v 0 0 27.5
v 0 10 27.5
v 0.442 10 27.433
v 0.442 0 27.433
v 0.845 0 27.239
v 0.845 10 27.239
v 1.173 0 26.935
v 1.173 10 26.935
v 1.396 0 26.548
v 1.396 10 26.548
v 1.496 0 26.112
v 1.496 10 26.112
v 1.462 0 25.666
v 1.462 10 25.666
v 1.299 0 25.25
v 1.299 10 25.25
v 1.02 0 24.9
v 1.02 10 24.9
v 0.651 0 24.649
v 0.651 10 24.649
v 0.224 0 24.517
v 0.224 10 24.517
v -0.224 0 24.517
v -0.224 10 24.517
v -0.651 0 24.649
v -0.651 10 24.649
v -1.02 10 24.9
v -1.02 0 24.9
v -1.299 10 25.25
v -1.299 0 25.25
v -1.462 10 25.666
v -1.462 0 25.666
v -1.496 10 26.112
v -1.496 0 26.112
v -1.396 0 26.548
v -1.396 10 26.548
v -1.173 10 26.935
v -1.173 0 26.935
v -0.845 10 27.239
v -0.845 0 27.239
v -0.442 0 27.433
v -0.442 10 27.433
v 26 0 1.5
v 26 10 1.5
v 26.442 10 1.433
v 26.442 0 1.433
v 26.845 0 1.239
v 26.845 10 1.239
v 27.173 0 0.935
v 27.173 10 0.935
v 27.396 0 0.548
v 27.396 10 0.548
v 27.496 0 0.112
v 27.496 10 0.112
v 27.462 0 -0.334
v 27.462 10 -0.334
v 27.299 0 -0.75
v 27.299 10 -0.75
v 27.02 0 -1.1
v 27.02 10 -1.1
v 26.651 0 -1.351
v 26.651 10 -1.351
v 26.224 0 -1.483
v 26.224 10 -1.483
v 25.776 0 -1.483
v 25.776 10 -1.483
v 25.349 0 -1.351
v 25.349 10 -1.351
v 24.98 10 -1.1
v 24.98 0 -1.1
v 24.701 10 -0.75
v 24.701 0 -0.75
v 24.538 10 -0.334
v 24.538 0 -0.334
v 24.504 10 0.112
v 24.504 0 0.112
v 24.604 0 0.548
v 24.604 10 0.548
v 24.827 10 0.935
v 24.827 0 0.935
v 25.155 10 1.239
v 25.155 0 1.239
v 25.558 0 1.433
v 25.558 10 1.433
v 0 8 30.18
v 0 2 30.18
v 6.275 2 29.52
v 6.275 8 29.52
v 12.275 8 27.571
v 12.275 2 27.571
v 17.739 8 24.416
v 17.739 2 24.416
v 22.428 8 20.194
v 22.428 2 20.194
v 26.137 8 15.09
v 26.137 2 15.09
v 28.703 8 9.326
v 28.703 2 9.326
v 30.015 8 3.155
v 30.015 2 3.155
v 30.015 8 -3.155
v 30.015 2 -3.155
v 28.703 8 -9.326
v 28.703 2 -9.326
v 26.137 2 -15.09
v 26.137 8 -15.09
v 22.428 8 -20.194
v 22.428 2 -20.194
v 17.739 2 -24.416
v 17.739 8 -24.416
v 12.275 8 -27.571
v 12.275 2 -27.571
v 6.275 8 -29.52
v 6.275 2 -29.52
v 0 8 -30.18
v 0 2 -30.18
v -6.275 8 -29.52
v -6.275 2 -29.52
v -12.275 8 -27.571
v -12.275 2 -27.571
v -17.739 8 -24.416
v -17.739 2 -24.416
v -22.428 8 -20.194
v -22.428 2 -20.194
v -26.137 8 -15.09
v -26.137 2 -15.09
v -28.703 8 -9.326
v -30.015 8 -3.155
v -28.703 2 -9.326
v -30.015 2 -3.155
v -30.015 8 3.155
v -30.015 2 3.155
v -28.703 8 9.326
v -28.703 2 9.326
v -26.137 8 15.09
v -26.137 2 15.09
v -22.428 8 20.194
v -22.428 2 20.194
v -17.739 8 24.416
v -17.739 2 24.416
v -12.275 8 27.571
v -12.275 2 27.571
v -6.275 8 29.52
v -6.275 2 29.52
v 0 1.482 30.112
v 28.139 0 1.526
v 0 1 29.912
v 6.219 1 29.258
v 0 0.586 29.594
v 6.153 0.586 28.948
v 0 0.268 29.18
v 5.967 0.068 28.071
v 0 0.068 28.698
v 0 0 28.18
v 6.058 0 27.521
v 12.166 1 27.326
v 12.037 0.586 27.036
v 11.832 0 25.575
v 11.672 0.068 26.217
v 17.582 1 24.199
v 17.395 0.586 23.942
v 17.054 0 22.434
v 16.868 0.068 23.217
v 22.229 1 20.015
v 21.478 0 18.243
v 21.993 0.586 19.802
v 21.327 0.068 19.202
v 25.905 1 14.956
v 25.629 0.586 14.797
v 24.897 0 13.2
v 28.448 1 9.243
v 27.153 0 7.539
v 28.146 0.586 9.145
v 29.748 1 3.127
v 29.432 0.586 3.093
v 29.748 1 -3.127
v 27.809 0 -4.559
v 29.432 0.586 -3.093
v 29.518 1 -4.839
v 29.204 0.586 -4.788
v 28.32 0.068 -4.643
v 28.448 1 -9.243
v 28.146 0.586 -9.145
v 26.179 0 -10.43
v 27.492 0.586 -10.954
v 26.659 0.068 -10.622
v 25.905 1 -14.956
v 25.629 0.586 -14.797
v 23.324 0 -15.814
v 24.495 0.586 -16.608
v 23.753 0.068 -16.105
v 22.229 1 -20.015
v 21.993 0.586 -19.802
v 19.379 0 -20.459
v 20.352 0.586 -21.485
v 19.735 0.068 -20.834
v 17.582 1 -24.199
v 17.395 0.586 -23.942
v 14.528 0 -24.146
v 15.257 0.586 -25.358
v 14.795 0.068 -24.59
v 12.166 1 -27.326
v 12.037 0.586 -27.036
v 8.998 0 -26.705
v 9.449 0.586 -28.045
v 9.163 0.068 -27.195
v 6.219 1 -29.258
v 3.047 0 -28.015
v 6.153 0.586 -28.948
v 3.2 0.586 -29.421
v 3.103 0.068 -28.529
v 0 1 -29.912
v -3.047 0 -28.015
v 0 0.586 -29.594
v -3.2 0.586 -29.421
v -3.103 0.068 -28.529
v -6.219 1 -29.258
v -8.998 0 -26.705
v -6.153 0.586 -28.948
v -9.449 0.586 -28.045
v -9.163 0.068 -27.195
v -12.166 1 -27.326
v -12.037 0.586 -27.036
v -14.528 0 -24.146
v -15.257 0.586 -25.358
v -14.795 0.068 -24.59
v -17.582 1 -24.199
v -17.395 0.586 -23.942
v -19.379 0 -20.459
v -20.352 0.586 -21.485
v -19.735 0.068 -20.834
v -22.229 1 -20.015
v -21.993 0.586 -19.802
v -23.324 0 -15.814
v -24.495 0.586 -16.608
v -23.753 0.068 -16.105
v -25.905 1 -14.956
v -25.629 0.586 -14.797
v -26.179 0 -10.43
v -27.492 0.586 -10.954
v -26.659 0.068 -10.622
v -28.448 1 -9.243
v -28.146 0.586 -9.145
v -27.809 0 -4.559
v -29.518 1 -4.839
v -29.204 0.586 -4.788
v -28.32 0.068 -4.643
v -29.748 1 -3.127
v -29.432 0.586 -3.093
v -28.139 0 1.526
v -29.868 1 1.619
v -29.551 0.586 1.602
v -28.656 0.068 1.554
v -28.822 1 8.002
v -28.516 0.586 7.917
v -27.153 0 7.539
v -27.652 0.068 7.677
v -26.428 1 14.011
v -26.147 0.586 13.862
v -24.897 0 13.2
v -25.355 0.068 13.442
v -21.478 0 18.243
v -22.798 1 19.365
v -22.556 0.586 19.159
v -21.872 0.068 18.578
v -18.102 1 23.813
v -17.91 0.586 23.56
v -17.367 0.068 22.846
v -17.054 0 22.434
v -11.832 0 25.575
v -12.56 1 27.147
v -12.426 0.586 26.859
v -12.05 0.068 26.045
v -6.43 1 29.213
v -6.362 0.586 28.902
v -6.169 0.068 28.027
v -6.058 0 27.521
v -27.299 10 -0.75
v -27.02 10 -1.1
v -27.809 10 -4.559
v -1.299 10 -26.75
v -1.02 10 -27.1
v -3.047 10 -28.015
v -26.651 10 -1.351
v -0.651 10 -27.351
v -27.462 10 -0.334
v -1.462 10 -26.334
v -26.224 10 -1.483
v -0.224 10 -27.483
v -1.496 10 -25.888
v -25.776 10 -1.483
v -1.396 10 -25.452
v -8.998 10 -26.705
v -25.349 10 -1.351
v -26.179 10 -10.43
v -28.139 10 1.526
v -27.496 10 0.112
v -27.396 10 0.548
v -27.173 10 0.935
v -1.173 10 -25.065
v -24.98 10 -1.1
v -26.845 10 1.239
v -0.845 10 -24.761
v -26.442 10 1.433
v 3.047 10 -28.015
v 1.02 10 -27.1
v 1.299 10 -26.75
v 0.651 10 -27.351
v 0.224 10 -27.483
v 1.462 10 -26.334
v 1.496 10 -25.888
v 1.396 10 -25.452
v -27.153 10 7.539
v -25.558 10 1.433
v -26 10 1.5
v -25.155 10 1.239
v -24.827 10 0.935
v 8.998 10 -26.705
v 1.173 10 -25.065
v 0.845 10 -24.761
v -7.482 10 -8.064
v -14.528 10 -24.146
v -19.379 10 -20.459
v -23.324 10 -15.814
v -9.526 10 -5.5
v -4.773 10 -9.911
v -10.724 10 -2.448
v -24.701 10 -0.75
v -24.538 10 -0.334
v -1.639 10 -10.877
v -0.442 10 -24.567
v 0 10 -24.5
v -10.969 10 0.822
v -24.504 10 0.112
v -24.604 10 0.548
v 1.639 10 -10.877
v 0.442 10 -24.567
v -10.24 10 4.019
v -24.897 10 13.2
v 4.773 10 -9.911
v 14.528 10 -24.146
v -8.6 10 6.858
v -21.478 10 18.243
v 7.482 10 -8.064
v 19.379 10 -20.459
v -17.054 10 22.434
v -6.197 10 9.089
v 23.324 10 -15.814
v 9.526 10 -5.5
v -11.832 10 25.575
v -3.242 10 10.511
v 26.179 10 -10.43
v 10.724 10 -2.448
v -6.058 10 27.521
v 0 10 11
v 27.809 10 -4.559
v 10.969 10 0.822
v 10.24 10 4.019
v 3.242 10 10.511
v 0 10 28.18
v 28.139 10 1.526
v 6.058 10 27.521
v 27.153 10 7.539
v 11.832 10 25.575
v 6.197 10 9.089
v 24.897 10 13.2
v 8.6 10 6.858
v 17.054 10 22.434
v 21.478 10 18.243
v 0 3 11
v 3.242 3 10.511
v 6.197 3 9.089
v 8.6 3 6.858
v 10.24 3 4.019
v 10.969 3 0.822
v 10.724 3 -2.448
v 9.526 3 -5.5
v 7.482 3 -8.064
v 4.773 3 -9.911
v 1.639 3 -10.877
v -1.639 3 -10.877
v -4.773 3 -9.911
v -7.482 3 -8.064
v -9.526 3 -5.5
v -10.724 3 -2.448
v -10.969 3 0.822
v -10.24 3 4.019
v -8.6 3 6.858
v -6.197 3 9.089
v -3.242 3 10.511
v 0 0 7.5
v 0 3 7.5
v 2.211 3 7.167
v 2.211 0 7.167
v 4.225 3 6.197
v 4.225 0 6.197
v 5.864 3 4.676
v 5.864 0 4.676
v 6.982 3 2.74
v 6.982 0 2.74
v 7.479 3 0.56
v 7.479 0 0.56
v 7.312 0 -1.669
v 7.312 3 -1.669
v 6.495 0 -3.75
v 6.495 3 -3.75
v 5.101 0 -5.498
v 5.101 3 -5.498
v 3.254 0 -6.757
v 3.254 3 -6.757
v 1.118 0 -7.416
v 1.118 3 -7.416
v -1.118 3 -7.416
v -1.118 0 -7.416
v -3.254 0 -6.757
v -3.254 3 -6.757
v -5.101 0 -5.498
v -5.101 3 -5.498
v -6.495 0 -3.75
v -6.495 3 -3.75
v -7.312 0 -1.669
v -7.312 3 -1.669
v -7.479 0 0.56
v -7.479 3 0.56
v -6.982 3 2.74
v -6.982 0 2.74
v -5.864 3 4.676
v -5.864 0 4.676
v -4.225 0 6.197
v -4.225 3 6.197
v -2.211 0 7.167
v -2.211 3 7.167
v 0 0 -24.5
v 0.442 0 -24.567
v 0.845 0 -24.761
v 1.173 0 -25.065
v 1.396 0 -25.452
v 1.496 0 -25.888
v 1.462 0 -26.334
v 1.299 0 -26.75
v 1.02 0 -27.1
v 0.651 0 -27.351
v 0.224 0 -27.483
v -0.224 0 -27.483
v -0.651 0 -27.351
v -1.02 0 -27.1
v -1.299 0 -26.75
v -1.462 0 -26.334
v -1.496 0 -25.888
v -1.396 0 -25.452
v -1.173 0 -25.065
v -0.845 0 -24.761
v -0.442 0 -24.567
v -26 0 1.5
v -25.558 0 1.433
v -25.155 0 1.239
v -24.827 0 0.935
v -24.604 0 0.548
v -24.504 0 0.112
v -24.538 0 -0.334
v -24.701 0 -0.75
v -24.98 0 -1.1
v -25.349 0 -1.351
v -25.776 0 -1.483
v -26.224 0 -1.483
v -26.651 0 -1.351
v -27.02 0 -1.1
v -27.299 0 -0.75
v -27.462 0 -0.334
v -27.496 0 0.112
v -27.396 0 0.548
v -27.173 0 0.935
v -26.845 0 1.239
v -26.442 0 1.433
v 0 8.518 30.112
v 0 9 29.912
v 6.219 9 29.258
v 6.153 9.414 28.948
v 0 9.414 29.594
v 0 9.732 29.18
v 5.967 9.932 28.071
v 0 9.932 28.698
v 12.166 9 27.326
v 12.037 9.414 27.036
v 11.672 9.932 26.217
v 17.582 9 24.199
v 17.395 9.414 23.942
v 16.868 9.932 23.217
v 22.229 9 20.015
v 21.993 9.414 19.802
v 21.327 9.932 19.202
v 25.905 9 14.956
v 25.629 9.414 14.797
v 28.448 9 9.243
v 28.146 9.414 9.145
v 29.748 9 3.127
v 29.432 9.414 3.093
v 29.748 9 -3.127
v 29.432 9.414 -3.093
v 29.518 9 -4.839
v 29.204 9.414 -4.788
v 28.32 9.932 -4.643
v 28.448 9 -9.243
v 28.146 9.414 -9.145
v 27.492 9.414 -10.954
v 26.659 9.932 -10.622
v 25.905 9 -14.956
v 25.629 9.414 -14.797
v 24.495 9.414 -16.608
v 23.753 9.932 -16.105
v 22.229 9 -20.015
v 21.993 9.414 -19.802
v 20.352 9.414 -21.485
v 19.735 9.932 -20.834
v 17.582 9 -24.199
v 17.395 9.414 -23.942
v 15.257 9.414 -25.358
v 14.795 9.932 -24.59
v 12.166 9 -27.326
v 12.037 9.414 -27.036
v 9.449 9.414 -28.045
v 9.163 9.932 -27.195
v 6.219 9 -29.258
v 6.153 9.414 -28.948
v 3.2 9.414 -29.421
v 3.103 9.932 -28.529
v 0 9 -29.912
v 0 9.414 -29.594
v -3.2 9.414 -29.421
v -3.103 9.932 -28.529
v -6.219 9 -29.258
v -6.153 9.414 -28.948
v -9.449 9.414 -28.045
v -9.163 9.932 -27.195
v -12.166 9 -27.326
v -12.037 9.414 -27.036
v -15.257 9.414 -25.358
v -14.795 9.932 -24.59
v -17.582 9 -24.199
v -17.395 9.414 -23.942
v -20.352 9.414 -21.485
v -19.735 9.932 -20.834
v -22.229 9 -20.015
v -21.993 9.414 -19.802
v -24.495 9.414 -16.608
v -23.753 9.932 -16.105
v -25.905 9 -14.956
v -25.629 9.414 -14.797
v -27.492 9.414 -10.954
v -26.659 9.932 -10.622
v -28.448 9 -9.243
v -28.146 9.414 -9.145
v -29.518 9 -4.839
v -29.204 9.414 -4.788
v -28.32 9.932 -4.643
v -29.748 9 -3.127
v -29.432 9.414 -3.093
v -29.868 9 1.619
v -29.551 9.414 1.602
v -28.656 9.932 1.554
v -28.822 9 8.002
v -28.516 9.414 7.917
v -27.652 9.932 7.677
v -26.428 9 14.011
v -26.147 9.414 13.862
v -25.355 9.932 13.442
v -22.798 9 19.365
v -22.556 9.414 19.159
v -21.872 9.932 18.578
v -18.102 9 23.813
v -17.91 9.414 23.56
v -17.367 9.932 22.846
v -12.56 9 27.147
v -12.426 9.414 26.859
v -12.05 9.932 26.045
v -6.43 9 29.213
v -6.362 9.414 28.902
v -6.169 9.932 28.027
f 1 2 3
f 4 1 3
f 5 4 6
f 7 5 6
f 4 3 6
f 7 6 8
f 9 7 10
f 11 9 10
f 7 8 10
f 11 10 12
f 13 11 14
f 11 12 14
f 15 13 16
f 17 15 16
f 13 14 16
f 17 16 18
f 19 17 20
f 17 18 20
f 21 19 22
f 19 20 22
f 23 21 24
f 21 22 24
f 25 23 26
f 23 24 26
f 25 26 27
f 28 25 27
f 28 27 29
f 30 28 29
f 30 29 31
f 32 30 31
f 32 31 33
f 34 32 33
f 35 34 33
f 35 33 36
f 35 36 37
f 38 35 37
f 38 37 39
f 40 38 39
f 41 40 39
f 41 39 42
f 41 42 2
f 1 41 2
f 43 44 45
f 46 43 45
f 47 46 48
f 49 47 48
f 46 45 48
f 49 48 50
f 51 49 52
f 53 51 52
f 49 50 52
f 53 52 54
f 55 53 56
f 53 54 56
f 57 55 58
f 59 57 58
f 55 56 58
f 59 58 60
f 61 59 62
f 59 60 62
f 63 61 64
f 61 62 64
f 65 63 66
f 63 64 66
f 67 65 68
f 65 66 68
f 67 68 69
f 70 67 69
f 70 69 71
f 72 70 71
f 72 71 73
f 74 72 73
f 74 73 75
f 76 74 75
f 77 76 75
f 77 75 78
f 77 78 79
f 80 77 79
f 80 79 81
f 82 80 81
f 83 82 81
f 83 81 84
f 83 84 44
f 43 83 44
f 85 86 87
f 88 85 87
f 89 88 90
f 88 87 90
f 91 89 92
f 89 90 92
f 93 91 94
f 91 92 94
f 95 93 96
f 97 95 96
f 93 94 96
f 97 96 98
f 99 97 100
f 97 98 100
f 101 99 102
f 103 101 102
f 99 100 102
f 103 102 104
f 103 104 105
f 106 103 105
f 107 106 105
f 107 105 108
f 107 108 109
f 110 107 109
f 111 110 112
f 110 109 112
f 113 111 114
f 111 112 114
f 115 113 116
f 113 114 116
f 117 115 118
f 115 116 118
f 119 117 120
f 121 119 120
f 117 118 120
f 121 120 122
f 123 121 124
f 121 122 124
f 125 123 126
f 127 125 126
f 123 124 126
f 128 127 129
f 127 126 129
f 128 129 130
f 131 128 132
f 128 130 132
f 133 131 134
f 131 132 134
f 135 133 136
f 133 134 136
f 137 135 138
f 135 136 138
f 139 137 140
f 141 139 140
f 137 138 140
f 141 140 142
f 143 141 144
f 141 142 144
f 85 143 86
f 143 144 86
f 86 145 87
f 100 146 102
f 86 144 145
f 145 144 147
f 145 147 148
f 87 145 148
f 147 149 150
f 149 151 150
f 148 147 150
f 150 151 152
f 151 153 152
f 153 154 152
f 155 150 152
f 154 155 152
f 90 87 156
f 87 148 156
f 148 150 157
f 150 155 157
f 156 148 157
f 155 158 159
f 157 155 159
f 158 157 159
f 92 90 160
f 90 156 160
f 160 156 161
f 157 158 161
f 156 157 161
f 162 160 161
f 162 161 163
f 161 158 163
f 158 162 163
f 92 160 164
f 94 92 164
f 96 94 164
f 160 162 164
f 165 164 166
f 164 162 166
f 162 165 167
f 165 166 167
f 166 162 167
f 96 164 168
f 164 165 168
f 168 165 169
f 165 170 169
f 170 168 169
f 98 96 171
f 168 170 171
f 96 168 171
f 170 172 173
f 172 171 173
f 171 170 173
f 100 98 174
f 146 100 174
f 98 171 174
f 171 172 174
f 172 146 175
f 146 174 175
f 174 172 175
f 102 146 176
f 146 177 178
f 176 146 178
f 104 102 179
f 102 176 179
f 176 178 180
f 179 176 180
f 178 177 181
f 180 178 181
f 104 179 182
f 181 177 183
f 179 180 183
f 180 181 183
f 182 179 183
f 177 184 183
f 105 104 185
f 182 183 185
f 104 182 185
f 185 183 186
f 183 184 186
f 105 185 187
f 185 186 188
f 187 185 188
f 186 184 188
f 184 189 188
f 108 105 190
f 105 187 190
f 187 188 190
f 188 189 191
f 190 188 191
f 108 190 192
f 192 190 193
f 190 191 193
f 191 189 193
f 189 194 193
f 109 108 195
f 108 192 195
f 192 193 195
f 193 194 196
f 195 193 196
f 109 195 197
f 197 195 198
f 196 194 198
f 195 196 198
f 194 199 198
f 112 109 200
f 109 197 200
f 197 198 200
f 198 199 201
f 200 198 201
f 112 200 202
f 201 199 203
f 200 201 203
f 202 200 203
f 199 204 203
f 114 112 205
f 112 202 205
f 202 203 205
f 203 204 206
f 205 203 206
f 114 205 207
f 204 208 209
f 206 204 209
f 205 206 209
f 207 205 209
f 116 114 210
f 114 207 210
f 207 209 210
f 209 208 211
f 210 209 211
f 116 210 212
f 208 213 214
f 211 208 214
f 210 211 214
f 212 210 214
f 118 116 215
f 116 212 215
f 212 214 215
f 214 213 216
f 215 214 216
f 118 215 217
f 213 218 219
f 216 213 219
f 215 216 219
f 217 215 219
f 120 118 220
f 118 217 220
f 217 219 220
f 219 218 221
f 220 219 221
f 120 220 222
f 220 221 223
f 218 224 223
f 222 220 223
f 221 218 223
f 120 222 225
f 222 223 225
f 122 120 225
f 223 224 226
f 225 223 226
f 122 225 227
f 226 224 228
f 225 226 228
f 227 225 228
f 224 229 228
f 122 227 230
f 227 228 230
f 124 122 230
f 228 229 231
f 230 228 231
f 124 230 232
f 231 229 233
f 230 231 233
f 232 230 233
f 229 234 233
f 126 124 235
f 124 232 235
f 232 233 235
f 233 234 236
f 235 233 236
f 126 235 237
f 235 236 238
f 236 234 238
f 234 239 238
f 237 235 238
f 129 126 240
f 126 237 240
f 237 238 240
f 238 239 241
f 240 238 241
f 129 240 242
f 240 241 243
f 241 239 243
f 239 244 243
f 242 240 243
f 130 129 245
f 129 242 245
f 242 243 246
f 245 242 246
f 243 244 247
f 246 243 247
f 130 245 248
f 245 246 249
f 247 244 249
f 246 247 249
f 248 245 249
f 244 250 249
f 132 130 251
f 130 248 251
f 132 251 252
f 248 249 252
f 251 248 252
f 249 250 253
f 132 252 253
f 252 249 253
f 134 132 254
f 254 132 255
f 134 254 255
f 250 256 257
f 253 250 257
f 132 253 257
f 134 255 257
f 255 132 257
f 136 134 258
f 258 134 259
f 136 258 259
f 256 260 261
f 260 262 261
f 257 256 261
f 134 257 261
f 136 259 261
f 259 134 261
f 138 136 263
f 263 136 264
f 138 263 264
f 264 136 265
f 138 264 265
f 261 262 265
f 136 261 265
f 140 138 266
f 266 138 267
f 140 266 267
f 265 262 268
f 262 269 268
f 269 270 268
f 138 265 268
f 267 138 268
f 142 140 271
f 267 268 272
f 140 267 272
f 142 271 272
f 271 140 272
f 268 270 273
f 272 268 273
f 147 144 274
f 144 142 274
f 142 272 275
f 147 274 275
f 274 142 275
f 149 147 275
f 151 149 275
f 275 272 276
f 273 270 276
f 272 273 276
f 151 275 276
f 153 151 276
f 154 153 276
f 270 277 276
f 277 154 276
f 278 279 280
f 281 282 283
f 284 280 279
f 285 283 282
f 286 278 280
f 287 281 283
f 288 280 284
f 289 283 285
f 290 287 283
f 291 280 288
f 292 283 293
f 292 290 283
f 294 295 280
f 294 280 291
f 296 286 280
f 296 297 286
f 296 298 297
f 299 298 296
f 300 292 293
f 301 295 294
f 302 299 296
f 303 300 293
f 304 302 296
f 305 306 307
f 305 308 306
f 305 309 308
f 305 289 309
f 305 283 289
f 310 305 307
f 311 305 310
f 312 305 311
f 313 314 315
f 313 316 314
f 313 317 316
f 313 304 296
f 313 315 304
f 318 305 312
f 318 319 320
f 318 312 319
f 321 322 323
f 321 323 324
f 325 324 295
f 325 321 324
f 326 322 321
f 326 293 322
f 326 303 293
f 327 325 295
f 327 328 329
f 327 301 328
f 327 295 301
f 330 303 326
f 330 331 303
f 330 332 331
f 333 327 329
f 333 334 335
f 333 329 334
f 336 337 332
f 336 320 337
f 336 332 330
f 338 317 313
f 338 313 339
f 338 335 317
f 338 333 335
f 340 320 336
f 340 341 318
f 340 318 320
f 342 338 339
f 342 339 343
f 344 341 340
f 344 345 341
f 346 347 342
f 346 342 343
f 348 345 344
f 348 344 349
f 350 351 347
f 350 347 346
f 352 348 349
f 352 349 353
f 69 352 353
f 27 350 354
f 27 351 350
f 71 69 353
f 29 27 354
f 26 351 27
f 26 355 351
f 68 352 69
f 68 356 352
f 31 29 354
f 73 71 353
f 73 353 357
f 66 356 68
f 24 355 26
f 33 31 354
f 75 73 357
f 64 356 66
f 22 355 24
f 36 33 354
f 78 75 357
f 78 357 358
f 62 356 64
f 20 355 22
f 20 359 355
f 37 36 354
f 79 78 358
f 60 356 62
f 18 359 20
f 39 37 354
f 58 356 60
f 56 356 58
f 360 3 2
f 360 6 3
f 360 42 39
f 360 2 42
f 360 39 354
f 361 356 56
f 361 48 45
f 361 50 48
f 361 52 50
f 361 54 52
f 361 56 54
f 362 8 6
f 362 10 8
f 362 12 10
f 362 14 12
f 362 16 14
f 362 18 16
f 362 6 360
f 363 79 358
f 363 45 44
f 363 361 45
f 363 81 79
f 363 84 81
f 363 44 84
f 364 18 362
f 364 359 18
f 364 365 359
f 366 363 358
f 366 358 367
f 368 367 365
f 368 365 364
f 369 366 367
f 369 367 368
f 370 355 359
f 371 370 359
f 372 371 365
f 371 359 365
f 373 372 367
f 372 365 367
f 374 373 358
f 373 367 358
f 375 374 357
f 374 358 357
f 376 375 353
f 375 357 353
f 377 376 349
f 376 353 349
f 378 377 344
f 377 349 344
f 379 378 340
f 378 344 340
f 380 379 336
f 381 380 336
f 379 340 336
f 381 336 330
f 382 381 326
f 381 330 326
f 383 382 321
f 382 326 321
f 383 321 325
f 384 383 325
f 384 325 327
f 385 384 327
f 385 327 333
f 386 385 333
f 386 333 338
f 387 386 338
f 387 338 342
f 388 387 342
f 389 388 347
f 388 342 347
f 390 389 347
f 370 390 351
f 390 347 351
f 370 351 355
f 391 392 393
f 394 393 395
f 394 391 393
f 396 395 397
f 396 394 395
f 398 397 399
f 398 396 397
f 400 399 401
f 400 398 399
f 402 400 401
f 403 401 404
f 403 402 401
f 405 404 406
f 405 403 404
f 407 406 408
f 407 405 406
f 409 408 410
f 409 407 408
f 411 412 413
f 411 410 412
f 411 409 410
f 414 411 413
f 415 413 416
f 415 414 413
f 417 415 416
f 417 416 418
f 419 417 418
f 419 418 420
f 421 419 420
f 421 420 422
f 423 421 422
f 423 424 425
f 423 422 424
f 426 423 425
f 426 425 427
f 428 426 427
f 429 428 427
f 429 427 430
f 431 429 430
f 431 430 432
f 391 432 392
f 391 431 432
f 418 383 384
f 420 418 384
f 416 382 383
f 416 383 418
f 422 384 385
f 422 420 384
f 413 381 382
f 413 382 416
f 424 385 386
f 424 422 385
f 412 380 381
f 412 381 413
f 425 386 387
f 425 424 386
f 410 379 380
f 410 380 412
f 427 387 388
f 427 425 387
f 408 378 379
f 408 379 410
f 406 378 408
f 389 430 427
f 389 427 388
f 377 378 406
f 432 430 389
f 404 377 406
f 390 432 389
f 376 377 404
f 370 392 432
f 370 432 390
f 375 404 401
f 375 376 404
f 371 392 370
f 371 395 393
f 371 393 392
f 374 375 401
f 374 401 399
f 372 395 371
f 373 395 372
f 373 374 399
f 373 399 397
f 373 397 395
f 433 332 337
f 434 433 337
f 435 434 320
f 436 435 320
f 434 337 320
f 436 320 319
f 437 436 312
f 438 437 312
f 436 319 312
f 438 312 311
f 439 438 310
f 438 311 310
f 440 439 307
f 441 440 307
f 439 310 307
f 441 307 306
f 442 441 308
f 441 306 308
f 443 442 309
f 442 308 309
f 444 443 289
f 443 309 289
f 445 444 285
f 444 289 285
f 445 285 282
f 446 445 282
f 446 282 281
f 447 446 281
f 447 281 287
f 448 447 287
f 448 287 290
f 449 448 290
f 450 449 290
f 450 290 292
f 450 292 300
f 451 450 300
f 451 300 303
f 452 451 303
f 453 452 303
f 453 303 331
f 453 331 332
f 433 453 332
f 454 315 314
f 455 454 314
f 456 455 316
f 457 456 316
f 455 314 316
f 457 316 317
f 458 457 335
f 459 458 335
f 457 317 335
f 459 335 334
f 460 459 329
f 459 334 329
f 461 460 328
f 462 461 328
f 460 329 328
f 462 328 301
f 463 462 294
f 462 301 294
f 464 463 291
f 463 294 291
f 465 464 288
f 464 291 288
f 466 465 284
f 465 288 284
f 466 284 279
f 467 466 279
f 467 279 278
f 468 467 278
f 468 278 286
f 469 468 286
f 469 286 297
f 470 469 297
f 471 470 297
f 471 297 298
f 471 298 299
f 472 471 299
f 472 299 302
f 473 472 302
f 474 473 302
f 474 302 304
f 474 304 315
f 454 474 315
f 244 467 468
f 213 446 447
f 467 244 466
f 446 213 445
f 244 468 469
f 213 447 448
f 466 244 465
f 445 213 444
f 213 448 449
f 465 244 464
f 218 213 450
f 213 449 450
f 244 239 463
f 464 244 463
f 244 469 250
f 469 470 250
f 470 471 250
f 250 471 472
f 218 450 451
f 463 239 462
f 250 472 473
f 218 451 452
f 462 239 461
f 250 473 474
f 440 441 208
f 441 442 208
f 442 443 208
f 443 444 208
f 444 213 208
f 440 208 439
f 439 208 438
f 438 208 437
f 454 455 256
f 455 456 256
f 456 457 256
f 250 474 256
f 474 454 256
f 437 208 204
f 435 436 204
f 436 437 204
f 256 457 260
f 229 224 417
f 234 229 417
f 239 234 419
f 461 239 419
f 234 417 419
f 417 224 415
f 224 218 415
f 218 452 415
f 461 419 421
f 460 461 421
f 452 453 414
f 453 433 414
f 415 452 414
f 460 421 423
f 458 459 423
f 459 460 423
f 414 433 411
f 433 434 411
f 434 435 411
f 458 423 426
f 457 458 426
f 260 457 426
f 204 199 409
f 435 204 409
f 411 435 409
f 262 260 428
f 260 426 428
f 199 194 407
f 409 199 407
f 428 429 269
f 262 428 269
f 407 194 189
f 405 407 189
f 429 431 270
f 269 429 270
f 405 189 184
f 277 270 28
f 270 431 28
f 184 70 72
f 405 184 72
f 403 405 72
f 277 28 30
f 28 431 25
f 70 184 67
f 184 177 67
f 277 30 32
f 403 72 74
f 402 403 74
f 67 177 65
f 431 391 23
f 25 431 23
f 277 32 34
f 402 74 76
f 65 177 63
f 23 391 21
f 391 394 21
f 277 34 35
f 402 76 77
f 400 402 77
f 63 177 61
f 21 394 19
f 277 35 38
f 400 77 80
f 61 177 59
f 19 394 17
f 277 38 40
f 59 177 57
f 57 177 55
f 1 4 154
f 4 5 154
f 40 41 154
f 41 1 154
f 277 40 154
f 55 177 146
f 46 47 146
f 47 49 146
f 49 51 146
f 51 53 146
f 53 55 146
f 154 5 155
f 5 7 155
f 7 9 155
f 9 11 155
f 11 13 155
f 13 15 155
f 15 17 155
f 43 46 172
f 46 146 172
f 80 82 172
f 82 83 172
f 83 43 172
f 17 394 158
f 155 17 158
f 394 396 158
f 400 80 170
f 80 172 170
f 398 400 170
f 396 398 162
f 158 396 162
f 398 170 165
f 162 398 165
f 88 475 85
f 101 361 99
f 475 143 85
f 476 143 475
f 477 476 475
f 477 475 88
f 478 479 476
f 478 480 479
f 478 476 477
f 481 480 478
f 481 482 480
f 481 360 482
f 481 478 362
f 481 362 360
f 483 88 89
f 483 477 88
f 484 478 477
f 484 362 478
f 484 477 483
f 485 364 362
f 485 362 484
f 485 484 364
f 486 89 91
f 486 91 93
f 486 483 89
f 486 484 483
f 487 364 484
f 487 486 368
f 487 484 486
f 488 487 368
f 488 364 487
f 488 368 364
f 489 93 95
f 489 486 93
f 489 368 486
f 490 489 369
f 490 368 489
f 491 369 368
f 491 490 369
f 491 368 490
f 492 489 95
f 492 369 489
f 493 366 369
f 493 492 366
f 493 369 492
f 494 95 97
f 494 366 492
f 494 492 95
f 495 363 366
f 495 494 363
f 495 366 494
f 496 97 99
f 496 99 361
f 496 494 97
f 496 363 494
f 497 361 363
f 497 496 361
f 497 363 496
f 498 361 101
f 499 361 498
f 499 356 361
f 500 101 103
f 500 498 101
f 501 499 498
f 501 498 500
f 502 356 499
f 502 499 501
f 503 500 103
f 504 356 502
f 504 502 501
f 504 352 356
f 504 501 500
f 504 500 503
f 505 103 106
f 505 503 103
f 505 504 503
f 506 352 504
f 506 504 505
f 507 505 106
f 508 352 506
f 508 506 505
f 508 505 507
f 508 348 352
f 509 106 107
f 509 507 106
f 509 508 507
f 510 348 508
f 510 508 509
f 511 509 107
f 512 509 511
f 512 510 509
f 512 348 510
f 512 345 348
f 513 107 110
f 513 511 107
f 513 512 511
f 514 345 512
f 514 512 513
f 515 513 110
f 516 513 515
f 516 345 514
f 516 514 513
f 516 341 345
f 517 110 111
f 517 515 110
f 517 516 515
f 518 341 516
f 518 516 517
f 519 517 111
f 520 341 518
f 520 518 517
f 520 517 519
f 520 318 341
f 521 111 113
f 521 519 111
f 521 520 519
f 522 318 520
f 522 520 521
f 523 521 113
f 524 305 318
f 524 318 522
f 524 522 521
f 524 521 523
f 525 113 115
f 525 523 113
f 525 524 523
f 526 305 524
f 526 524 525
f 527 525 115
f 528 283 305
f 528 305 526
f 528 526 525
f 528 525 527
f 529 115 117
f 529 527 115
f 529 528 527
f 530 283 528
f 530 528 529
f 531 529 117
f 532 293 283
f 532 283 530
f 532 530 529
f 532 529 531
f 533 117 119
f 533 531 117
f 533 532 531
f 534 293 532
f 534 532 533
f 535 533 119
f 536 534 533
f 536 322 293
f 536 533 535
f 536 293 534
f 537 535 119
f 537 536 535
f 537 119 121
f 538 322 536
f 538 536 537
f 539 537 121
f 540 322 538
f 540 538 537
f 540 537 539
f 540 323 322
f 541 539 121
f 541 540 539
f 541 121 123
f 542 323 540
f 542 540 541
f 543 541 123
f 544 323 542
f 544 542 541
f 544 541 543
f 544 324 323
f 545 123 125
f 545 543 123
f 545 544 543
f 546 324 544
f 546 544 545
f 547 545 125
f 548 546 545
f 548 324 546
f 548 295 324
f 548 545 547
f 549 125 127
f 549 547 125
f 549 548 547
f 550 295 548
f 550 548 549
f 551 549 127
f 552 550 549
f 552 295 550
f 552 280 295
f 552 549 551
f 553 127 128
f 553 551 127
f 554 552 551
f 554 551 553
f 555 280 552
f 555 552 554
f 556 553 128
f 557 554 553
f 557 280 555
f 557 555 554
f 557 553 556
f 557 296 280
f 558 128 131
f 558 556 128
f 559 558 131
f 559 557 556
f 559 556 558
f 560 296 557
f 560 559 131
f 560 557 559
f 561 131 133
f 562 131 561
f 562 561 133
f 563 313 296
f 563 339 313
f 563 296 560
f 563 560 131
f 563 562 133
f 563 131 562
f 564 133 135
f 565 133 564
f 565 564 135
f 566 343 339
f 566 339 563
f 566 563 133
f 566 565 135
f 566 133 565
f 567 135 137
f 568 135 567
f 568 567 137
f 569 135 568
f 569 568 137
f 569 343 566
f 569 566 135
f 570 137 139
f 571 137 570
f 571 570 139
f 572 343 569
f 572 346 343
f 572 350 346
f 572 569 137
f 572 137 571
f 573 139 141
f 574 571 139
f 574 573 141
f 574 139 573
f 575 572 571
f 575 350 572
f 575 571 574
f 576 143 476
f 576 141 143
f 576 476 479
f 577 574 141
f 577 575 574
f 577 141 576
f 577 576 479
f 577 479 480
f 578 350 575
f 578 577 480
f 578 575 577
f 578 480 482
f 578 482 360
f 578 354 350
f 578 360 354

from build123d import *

# Parameters (mm, degrees)
SKETCH1_R           = 30.18
SKETCH1_R_2         = 7.5
BOSS_EXTRUDE1_DEPTH = 10
SKETCH2_R           = 1.5
CUT_EXTRUDE1_DEPTH  = 44.836797328
SKETCH3_R           = 11
CUT_EXTRUDE2_DEPTH  = 7
FILLET1_R           = 2


with BuildPart() as part:
    # Sketch1 → Boss-Extrude1 (new body)
    with BuildSketch(Plane(origin=(0, 0, 0), x_dir=(1, 0, 0), z_dir=(0, 1, 0))):
        with Locations(Location((0, 0, 0), (0, 0, 270))):
            Circle(SKETCH1_R)
        with Locations(Location((0, 0, 0), (0, 0, 270))):
            Circle(SKETCH1_R_2, mode=Mode.SUBTRACT)
    extrude(amount=BOSS_EXTRUDE1_DEPTH)

    # Sketch2 → Cut-Extrude1 (cut, through all)
    with BuildSketch(Plane(origin=(0, 10, 0), x_dir=(1, 0, 0), z_dir=(0, 1, 0))):
        with Locations(Location((0, 26, 0), (0, 0, 270))):
            Circle(SKETCH2_R)
        with Locations(Location((26, 0, 0), (0, 0, 270))):
            Circle(SKETCH2_R)
        with Locations(Location((-26, 0, 0), (0, 0, 270))):
            Circle(SKETCH2_R)
        with Locations(Location((0, -26, 0), (0, 0, 270))):
            Circle(SKETCH2_R)
    extrude(amount=-CUT_EXTRUDE1_DEPTH, mode=Mode.SUBTRACT)

    # Sketch3 → Cut-Extrude2 (cut)
    with BuildSketch(Plane(origin=(0, 10, 0), x_dir=(1, 0, 0), z_dir=(0, 1, 0))):
        with Locations(Location((0, 0, 0), (0, 0, 270))):
            Circle(SKETCH3_R)
    extrude(amount=-CUT_EXTRUDE2_DEPTH, mode=Mode.SUBTRACT)

    # Fillet1
    fillet1_edges = [part.edges().sort_by_distance(p)[0] for p in [
        (0, 0, -30.18),
        (0, 10, -30.18),
    ]]
    fillet(fillet1_edges, radius=FILLET1_R)


solid = part.part
